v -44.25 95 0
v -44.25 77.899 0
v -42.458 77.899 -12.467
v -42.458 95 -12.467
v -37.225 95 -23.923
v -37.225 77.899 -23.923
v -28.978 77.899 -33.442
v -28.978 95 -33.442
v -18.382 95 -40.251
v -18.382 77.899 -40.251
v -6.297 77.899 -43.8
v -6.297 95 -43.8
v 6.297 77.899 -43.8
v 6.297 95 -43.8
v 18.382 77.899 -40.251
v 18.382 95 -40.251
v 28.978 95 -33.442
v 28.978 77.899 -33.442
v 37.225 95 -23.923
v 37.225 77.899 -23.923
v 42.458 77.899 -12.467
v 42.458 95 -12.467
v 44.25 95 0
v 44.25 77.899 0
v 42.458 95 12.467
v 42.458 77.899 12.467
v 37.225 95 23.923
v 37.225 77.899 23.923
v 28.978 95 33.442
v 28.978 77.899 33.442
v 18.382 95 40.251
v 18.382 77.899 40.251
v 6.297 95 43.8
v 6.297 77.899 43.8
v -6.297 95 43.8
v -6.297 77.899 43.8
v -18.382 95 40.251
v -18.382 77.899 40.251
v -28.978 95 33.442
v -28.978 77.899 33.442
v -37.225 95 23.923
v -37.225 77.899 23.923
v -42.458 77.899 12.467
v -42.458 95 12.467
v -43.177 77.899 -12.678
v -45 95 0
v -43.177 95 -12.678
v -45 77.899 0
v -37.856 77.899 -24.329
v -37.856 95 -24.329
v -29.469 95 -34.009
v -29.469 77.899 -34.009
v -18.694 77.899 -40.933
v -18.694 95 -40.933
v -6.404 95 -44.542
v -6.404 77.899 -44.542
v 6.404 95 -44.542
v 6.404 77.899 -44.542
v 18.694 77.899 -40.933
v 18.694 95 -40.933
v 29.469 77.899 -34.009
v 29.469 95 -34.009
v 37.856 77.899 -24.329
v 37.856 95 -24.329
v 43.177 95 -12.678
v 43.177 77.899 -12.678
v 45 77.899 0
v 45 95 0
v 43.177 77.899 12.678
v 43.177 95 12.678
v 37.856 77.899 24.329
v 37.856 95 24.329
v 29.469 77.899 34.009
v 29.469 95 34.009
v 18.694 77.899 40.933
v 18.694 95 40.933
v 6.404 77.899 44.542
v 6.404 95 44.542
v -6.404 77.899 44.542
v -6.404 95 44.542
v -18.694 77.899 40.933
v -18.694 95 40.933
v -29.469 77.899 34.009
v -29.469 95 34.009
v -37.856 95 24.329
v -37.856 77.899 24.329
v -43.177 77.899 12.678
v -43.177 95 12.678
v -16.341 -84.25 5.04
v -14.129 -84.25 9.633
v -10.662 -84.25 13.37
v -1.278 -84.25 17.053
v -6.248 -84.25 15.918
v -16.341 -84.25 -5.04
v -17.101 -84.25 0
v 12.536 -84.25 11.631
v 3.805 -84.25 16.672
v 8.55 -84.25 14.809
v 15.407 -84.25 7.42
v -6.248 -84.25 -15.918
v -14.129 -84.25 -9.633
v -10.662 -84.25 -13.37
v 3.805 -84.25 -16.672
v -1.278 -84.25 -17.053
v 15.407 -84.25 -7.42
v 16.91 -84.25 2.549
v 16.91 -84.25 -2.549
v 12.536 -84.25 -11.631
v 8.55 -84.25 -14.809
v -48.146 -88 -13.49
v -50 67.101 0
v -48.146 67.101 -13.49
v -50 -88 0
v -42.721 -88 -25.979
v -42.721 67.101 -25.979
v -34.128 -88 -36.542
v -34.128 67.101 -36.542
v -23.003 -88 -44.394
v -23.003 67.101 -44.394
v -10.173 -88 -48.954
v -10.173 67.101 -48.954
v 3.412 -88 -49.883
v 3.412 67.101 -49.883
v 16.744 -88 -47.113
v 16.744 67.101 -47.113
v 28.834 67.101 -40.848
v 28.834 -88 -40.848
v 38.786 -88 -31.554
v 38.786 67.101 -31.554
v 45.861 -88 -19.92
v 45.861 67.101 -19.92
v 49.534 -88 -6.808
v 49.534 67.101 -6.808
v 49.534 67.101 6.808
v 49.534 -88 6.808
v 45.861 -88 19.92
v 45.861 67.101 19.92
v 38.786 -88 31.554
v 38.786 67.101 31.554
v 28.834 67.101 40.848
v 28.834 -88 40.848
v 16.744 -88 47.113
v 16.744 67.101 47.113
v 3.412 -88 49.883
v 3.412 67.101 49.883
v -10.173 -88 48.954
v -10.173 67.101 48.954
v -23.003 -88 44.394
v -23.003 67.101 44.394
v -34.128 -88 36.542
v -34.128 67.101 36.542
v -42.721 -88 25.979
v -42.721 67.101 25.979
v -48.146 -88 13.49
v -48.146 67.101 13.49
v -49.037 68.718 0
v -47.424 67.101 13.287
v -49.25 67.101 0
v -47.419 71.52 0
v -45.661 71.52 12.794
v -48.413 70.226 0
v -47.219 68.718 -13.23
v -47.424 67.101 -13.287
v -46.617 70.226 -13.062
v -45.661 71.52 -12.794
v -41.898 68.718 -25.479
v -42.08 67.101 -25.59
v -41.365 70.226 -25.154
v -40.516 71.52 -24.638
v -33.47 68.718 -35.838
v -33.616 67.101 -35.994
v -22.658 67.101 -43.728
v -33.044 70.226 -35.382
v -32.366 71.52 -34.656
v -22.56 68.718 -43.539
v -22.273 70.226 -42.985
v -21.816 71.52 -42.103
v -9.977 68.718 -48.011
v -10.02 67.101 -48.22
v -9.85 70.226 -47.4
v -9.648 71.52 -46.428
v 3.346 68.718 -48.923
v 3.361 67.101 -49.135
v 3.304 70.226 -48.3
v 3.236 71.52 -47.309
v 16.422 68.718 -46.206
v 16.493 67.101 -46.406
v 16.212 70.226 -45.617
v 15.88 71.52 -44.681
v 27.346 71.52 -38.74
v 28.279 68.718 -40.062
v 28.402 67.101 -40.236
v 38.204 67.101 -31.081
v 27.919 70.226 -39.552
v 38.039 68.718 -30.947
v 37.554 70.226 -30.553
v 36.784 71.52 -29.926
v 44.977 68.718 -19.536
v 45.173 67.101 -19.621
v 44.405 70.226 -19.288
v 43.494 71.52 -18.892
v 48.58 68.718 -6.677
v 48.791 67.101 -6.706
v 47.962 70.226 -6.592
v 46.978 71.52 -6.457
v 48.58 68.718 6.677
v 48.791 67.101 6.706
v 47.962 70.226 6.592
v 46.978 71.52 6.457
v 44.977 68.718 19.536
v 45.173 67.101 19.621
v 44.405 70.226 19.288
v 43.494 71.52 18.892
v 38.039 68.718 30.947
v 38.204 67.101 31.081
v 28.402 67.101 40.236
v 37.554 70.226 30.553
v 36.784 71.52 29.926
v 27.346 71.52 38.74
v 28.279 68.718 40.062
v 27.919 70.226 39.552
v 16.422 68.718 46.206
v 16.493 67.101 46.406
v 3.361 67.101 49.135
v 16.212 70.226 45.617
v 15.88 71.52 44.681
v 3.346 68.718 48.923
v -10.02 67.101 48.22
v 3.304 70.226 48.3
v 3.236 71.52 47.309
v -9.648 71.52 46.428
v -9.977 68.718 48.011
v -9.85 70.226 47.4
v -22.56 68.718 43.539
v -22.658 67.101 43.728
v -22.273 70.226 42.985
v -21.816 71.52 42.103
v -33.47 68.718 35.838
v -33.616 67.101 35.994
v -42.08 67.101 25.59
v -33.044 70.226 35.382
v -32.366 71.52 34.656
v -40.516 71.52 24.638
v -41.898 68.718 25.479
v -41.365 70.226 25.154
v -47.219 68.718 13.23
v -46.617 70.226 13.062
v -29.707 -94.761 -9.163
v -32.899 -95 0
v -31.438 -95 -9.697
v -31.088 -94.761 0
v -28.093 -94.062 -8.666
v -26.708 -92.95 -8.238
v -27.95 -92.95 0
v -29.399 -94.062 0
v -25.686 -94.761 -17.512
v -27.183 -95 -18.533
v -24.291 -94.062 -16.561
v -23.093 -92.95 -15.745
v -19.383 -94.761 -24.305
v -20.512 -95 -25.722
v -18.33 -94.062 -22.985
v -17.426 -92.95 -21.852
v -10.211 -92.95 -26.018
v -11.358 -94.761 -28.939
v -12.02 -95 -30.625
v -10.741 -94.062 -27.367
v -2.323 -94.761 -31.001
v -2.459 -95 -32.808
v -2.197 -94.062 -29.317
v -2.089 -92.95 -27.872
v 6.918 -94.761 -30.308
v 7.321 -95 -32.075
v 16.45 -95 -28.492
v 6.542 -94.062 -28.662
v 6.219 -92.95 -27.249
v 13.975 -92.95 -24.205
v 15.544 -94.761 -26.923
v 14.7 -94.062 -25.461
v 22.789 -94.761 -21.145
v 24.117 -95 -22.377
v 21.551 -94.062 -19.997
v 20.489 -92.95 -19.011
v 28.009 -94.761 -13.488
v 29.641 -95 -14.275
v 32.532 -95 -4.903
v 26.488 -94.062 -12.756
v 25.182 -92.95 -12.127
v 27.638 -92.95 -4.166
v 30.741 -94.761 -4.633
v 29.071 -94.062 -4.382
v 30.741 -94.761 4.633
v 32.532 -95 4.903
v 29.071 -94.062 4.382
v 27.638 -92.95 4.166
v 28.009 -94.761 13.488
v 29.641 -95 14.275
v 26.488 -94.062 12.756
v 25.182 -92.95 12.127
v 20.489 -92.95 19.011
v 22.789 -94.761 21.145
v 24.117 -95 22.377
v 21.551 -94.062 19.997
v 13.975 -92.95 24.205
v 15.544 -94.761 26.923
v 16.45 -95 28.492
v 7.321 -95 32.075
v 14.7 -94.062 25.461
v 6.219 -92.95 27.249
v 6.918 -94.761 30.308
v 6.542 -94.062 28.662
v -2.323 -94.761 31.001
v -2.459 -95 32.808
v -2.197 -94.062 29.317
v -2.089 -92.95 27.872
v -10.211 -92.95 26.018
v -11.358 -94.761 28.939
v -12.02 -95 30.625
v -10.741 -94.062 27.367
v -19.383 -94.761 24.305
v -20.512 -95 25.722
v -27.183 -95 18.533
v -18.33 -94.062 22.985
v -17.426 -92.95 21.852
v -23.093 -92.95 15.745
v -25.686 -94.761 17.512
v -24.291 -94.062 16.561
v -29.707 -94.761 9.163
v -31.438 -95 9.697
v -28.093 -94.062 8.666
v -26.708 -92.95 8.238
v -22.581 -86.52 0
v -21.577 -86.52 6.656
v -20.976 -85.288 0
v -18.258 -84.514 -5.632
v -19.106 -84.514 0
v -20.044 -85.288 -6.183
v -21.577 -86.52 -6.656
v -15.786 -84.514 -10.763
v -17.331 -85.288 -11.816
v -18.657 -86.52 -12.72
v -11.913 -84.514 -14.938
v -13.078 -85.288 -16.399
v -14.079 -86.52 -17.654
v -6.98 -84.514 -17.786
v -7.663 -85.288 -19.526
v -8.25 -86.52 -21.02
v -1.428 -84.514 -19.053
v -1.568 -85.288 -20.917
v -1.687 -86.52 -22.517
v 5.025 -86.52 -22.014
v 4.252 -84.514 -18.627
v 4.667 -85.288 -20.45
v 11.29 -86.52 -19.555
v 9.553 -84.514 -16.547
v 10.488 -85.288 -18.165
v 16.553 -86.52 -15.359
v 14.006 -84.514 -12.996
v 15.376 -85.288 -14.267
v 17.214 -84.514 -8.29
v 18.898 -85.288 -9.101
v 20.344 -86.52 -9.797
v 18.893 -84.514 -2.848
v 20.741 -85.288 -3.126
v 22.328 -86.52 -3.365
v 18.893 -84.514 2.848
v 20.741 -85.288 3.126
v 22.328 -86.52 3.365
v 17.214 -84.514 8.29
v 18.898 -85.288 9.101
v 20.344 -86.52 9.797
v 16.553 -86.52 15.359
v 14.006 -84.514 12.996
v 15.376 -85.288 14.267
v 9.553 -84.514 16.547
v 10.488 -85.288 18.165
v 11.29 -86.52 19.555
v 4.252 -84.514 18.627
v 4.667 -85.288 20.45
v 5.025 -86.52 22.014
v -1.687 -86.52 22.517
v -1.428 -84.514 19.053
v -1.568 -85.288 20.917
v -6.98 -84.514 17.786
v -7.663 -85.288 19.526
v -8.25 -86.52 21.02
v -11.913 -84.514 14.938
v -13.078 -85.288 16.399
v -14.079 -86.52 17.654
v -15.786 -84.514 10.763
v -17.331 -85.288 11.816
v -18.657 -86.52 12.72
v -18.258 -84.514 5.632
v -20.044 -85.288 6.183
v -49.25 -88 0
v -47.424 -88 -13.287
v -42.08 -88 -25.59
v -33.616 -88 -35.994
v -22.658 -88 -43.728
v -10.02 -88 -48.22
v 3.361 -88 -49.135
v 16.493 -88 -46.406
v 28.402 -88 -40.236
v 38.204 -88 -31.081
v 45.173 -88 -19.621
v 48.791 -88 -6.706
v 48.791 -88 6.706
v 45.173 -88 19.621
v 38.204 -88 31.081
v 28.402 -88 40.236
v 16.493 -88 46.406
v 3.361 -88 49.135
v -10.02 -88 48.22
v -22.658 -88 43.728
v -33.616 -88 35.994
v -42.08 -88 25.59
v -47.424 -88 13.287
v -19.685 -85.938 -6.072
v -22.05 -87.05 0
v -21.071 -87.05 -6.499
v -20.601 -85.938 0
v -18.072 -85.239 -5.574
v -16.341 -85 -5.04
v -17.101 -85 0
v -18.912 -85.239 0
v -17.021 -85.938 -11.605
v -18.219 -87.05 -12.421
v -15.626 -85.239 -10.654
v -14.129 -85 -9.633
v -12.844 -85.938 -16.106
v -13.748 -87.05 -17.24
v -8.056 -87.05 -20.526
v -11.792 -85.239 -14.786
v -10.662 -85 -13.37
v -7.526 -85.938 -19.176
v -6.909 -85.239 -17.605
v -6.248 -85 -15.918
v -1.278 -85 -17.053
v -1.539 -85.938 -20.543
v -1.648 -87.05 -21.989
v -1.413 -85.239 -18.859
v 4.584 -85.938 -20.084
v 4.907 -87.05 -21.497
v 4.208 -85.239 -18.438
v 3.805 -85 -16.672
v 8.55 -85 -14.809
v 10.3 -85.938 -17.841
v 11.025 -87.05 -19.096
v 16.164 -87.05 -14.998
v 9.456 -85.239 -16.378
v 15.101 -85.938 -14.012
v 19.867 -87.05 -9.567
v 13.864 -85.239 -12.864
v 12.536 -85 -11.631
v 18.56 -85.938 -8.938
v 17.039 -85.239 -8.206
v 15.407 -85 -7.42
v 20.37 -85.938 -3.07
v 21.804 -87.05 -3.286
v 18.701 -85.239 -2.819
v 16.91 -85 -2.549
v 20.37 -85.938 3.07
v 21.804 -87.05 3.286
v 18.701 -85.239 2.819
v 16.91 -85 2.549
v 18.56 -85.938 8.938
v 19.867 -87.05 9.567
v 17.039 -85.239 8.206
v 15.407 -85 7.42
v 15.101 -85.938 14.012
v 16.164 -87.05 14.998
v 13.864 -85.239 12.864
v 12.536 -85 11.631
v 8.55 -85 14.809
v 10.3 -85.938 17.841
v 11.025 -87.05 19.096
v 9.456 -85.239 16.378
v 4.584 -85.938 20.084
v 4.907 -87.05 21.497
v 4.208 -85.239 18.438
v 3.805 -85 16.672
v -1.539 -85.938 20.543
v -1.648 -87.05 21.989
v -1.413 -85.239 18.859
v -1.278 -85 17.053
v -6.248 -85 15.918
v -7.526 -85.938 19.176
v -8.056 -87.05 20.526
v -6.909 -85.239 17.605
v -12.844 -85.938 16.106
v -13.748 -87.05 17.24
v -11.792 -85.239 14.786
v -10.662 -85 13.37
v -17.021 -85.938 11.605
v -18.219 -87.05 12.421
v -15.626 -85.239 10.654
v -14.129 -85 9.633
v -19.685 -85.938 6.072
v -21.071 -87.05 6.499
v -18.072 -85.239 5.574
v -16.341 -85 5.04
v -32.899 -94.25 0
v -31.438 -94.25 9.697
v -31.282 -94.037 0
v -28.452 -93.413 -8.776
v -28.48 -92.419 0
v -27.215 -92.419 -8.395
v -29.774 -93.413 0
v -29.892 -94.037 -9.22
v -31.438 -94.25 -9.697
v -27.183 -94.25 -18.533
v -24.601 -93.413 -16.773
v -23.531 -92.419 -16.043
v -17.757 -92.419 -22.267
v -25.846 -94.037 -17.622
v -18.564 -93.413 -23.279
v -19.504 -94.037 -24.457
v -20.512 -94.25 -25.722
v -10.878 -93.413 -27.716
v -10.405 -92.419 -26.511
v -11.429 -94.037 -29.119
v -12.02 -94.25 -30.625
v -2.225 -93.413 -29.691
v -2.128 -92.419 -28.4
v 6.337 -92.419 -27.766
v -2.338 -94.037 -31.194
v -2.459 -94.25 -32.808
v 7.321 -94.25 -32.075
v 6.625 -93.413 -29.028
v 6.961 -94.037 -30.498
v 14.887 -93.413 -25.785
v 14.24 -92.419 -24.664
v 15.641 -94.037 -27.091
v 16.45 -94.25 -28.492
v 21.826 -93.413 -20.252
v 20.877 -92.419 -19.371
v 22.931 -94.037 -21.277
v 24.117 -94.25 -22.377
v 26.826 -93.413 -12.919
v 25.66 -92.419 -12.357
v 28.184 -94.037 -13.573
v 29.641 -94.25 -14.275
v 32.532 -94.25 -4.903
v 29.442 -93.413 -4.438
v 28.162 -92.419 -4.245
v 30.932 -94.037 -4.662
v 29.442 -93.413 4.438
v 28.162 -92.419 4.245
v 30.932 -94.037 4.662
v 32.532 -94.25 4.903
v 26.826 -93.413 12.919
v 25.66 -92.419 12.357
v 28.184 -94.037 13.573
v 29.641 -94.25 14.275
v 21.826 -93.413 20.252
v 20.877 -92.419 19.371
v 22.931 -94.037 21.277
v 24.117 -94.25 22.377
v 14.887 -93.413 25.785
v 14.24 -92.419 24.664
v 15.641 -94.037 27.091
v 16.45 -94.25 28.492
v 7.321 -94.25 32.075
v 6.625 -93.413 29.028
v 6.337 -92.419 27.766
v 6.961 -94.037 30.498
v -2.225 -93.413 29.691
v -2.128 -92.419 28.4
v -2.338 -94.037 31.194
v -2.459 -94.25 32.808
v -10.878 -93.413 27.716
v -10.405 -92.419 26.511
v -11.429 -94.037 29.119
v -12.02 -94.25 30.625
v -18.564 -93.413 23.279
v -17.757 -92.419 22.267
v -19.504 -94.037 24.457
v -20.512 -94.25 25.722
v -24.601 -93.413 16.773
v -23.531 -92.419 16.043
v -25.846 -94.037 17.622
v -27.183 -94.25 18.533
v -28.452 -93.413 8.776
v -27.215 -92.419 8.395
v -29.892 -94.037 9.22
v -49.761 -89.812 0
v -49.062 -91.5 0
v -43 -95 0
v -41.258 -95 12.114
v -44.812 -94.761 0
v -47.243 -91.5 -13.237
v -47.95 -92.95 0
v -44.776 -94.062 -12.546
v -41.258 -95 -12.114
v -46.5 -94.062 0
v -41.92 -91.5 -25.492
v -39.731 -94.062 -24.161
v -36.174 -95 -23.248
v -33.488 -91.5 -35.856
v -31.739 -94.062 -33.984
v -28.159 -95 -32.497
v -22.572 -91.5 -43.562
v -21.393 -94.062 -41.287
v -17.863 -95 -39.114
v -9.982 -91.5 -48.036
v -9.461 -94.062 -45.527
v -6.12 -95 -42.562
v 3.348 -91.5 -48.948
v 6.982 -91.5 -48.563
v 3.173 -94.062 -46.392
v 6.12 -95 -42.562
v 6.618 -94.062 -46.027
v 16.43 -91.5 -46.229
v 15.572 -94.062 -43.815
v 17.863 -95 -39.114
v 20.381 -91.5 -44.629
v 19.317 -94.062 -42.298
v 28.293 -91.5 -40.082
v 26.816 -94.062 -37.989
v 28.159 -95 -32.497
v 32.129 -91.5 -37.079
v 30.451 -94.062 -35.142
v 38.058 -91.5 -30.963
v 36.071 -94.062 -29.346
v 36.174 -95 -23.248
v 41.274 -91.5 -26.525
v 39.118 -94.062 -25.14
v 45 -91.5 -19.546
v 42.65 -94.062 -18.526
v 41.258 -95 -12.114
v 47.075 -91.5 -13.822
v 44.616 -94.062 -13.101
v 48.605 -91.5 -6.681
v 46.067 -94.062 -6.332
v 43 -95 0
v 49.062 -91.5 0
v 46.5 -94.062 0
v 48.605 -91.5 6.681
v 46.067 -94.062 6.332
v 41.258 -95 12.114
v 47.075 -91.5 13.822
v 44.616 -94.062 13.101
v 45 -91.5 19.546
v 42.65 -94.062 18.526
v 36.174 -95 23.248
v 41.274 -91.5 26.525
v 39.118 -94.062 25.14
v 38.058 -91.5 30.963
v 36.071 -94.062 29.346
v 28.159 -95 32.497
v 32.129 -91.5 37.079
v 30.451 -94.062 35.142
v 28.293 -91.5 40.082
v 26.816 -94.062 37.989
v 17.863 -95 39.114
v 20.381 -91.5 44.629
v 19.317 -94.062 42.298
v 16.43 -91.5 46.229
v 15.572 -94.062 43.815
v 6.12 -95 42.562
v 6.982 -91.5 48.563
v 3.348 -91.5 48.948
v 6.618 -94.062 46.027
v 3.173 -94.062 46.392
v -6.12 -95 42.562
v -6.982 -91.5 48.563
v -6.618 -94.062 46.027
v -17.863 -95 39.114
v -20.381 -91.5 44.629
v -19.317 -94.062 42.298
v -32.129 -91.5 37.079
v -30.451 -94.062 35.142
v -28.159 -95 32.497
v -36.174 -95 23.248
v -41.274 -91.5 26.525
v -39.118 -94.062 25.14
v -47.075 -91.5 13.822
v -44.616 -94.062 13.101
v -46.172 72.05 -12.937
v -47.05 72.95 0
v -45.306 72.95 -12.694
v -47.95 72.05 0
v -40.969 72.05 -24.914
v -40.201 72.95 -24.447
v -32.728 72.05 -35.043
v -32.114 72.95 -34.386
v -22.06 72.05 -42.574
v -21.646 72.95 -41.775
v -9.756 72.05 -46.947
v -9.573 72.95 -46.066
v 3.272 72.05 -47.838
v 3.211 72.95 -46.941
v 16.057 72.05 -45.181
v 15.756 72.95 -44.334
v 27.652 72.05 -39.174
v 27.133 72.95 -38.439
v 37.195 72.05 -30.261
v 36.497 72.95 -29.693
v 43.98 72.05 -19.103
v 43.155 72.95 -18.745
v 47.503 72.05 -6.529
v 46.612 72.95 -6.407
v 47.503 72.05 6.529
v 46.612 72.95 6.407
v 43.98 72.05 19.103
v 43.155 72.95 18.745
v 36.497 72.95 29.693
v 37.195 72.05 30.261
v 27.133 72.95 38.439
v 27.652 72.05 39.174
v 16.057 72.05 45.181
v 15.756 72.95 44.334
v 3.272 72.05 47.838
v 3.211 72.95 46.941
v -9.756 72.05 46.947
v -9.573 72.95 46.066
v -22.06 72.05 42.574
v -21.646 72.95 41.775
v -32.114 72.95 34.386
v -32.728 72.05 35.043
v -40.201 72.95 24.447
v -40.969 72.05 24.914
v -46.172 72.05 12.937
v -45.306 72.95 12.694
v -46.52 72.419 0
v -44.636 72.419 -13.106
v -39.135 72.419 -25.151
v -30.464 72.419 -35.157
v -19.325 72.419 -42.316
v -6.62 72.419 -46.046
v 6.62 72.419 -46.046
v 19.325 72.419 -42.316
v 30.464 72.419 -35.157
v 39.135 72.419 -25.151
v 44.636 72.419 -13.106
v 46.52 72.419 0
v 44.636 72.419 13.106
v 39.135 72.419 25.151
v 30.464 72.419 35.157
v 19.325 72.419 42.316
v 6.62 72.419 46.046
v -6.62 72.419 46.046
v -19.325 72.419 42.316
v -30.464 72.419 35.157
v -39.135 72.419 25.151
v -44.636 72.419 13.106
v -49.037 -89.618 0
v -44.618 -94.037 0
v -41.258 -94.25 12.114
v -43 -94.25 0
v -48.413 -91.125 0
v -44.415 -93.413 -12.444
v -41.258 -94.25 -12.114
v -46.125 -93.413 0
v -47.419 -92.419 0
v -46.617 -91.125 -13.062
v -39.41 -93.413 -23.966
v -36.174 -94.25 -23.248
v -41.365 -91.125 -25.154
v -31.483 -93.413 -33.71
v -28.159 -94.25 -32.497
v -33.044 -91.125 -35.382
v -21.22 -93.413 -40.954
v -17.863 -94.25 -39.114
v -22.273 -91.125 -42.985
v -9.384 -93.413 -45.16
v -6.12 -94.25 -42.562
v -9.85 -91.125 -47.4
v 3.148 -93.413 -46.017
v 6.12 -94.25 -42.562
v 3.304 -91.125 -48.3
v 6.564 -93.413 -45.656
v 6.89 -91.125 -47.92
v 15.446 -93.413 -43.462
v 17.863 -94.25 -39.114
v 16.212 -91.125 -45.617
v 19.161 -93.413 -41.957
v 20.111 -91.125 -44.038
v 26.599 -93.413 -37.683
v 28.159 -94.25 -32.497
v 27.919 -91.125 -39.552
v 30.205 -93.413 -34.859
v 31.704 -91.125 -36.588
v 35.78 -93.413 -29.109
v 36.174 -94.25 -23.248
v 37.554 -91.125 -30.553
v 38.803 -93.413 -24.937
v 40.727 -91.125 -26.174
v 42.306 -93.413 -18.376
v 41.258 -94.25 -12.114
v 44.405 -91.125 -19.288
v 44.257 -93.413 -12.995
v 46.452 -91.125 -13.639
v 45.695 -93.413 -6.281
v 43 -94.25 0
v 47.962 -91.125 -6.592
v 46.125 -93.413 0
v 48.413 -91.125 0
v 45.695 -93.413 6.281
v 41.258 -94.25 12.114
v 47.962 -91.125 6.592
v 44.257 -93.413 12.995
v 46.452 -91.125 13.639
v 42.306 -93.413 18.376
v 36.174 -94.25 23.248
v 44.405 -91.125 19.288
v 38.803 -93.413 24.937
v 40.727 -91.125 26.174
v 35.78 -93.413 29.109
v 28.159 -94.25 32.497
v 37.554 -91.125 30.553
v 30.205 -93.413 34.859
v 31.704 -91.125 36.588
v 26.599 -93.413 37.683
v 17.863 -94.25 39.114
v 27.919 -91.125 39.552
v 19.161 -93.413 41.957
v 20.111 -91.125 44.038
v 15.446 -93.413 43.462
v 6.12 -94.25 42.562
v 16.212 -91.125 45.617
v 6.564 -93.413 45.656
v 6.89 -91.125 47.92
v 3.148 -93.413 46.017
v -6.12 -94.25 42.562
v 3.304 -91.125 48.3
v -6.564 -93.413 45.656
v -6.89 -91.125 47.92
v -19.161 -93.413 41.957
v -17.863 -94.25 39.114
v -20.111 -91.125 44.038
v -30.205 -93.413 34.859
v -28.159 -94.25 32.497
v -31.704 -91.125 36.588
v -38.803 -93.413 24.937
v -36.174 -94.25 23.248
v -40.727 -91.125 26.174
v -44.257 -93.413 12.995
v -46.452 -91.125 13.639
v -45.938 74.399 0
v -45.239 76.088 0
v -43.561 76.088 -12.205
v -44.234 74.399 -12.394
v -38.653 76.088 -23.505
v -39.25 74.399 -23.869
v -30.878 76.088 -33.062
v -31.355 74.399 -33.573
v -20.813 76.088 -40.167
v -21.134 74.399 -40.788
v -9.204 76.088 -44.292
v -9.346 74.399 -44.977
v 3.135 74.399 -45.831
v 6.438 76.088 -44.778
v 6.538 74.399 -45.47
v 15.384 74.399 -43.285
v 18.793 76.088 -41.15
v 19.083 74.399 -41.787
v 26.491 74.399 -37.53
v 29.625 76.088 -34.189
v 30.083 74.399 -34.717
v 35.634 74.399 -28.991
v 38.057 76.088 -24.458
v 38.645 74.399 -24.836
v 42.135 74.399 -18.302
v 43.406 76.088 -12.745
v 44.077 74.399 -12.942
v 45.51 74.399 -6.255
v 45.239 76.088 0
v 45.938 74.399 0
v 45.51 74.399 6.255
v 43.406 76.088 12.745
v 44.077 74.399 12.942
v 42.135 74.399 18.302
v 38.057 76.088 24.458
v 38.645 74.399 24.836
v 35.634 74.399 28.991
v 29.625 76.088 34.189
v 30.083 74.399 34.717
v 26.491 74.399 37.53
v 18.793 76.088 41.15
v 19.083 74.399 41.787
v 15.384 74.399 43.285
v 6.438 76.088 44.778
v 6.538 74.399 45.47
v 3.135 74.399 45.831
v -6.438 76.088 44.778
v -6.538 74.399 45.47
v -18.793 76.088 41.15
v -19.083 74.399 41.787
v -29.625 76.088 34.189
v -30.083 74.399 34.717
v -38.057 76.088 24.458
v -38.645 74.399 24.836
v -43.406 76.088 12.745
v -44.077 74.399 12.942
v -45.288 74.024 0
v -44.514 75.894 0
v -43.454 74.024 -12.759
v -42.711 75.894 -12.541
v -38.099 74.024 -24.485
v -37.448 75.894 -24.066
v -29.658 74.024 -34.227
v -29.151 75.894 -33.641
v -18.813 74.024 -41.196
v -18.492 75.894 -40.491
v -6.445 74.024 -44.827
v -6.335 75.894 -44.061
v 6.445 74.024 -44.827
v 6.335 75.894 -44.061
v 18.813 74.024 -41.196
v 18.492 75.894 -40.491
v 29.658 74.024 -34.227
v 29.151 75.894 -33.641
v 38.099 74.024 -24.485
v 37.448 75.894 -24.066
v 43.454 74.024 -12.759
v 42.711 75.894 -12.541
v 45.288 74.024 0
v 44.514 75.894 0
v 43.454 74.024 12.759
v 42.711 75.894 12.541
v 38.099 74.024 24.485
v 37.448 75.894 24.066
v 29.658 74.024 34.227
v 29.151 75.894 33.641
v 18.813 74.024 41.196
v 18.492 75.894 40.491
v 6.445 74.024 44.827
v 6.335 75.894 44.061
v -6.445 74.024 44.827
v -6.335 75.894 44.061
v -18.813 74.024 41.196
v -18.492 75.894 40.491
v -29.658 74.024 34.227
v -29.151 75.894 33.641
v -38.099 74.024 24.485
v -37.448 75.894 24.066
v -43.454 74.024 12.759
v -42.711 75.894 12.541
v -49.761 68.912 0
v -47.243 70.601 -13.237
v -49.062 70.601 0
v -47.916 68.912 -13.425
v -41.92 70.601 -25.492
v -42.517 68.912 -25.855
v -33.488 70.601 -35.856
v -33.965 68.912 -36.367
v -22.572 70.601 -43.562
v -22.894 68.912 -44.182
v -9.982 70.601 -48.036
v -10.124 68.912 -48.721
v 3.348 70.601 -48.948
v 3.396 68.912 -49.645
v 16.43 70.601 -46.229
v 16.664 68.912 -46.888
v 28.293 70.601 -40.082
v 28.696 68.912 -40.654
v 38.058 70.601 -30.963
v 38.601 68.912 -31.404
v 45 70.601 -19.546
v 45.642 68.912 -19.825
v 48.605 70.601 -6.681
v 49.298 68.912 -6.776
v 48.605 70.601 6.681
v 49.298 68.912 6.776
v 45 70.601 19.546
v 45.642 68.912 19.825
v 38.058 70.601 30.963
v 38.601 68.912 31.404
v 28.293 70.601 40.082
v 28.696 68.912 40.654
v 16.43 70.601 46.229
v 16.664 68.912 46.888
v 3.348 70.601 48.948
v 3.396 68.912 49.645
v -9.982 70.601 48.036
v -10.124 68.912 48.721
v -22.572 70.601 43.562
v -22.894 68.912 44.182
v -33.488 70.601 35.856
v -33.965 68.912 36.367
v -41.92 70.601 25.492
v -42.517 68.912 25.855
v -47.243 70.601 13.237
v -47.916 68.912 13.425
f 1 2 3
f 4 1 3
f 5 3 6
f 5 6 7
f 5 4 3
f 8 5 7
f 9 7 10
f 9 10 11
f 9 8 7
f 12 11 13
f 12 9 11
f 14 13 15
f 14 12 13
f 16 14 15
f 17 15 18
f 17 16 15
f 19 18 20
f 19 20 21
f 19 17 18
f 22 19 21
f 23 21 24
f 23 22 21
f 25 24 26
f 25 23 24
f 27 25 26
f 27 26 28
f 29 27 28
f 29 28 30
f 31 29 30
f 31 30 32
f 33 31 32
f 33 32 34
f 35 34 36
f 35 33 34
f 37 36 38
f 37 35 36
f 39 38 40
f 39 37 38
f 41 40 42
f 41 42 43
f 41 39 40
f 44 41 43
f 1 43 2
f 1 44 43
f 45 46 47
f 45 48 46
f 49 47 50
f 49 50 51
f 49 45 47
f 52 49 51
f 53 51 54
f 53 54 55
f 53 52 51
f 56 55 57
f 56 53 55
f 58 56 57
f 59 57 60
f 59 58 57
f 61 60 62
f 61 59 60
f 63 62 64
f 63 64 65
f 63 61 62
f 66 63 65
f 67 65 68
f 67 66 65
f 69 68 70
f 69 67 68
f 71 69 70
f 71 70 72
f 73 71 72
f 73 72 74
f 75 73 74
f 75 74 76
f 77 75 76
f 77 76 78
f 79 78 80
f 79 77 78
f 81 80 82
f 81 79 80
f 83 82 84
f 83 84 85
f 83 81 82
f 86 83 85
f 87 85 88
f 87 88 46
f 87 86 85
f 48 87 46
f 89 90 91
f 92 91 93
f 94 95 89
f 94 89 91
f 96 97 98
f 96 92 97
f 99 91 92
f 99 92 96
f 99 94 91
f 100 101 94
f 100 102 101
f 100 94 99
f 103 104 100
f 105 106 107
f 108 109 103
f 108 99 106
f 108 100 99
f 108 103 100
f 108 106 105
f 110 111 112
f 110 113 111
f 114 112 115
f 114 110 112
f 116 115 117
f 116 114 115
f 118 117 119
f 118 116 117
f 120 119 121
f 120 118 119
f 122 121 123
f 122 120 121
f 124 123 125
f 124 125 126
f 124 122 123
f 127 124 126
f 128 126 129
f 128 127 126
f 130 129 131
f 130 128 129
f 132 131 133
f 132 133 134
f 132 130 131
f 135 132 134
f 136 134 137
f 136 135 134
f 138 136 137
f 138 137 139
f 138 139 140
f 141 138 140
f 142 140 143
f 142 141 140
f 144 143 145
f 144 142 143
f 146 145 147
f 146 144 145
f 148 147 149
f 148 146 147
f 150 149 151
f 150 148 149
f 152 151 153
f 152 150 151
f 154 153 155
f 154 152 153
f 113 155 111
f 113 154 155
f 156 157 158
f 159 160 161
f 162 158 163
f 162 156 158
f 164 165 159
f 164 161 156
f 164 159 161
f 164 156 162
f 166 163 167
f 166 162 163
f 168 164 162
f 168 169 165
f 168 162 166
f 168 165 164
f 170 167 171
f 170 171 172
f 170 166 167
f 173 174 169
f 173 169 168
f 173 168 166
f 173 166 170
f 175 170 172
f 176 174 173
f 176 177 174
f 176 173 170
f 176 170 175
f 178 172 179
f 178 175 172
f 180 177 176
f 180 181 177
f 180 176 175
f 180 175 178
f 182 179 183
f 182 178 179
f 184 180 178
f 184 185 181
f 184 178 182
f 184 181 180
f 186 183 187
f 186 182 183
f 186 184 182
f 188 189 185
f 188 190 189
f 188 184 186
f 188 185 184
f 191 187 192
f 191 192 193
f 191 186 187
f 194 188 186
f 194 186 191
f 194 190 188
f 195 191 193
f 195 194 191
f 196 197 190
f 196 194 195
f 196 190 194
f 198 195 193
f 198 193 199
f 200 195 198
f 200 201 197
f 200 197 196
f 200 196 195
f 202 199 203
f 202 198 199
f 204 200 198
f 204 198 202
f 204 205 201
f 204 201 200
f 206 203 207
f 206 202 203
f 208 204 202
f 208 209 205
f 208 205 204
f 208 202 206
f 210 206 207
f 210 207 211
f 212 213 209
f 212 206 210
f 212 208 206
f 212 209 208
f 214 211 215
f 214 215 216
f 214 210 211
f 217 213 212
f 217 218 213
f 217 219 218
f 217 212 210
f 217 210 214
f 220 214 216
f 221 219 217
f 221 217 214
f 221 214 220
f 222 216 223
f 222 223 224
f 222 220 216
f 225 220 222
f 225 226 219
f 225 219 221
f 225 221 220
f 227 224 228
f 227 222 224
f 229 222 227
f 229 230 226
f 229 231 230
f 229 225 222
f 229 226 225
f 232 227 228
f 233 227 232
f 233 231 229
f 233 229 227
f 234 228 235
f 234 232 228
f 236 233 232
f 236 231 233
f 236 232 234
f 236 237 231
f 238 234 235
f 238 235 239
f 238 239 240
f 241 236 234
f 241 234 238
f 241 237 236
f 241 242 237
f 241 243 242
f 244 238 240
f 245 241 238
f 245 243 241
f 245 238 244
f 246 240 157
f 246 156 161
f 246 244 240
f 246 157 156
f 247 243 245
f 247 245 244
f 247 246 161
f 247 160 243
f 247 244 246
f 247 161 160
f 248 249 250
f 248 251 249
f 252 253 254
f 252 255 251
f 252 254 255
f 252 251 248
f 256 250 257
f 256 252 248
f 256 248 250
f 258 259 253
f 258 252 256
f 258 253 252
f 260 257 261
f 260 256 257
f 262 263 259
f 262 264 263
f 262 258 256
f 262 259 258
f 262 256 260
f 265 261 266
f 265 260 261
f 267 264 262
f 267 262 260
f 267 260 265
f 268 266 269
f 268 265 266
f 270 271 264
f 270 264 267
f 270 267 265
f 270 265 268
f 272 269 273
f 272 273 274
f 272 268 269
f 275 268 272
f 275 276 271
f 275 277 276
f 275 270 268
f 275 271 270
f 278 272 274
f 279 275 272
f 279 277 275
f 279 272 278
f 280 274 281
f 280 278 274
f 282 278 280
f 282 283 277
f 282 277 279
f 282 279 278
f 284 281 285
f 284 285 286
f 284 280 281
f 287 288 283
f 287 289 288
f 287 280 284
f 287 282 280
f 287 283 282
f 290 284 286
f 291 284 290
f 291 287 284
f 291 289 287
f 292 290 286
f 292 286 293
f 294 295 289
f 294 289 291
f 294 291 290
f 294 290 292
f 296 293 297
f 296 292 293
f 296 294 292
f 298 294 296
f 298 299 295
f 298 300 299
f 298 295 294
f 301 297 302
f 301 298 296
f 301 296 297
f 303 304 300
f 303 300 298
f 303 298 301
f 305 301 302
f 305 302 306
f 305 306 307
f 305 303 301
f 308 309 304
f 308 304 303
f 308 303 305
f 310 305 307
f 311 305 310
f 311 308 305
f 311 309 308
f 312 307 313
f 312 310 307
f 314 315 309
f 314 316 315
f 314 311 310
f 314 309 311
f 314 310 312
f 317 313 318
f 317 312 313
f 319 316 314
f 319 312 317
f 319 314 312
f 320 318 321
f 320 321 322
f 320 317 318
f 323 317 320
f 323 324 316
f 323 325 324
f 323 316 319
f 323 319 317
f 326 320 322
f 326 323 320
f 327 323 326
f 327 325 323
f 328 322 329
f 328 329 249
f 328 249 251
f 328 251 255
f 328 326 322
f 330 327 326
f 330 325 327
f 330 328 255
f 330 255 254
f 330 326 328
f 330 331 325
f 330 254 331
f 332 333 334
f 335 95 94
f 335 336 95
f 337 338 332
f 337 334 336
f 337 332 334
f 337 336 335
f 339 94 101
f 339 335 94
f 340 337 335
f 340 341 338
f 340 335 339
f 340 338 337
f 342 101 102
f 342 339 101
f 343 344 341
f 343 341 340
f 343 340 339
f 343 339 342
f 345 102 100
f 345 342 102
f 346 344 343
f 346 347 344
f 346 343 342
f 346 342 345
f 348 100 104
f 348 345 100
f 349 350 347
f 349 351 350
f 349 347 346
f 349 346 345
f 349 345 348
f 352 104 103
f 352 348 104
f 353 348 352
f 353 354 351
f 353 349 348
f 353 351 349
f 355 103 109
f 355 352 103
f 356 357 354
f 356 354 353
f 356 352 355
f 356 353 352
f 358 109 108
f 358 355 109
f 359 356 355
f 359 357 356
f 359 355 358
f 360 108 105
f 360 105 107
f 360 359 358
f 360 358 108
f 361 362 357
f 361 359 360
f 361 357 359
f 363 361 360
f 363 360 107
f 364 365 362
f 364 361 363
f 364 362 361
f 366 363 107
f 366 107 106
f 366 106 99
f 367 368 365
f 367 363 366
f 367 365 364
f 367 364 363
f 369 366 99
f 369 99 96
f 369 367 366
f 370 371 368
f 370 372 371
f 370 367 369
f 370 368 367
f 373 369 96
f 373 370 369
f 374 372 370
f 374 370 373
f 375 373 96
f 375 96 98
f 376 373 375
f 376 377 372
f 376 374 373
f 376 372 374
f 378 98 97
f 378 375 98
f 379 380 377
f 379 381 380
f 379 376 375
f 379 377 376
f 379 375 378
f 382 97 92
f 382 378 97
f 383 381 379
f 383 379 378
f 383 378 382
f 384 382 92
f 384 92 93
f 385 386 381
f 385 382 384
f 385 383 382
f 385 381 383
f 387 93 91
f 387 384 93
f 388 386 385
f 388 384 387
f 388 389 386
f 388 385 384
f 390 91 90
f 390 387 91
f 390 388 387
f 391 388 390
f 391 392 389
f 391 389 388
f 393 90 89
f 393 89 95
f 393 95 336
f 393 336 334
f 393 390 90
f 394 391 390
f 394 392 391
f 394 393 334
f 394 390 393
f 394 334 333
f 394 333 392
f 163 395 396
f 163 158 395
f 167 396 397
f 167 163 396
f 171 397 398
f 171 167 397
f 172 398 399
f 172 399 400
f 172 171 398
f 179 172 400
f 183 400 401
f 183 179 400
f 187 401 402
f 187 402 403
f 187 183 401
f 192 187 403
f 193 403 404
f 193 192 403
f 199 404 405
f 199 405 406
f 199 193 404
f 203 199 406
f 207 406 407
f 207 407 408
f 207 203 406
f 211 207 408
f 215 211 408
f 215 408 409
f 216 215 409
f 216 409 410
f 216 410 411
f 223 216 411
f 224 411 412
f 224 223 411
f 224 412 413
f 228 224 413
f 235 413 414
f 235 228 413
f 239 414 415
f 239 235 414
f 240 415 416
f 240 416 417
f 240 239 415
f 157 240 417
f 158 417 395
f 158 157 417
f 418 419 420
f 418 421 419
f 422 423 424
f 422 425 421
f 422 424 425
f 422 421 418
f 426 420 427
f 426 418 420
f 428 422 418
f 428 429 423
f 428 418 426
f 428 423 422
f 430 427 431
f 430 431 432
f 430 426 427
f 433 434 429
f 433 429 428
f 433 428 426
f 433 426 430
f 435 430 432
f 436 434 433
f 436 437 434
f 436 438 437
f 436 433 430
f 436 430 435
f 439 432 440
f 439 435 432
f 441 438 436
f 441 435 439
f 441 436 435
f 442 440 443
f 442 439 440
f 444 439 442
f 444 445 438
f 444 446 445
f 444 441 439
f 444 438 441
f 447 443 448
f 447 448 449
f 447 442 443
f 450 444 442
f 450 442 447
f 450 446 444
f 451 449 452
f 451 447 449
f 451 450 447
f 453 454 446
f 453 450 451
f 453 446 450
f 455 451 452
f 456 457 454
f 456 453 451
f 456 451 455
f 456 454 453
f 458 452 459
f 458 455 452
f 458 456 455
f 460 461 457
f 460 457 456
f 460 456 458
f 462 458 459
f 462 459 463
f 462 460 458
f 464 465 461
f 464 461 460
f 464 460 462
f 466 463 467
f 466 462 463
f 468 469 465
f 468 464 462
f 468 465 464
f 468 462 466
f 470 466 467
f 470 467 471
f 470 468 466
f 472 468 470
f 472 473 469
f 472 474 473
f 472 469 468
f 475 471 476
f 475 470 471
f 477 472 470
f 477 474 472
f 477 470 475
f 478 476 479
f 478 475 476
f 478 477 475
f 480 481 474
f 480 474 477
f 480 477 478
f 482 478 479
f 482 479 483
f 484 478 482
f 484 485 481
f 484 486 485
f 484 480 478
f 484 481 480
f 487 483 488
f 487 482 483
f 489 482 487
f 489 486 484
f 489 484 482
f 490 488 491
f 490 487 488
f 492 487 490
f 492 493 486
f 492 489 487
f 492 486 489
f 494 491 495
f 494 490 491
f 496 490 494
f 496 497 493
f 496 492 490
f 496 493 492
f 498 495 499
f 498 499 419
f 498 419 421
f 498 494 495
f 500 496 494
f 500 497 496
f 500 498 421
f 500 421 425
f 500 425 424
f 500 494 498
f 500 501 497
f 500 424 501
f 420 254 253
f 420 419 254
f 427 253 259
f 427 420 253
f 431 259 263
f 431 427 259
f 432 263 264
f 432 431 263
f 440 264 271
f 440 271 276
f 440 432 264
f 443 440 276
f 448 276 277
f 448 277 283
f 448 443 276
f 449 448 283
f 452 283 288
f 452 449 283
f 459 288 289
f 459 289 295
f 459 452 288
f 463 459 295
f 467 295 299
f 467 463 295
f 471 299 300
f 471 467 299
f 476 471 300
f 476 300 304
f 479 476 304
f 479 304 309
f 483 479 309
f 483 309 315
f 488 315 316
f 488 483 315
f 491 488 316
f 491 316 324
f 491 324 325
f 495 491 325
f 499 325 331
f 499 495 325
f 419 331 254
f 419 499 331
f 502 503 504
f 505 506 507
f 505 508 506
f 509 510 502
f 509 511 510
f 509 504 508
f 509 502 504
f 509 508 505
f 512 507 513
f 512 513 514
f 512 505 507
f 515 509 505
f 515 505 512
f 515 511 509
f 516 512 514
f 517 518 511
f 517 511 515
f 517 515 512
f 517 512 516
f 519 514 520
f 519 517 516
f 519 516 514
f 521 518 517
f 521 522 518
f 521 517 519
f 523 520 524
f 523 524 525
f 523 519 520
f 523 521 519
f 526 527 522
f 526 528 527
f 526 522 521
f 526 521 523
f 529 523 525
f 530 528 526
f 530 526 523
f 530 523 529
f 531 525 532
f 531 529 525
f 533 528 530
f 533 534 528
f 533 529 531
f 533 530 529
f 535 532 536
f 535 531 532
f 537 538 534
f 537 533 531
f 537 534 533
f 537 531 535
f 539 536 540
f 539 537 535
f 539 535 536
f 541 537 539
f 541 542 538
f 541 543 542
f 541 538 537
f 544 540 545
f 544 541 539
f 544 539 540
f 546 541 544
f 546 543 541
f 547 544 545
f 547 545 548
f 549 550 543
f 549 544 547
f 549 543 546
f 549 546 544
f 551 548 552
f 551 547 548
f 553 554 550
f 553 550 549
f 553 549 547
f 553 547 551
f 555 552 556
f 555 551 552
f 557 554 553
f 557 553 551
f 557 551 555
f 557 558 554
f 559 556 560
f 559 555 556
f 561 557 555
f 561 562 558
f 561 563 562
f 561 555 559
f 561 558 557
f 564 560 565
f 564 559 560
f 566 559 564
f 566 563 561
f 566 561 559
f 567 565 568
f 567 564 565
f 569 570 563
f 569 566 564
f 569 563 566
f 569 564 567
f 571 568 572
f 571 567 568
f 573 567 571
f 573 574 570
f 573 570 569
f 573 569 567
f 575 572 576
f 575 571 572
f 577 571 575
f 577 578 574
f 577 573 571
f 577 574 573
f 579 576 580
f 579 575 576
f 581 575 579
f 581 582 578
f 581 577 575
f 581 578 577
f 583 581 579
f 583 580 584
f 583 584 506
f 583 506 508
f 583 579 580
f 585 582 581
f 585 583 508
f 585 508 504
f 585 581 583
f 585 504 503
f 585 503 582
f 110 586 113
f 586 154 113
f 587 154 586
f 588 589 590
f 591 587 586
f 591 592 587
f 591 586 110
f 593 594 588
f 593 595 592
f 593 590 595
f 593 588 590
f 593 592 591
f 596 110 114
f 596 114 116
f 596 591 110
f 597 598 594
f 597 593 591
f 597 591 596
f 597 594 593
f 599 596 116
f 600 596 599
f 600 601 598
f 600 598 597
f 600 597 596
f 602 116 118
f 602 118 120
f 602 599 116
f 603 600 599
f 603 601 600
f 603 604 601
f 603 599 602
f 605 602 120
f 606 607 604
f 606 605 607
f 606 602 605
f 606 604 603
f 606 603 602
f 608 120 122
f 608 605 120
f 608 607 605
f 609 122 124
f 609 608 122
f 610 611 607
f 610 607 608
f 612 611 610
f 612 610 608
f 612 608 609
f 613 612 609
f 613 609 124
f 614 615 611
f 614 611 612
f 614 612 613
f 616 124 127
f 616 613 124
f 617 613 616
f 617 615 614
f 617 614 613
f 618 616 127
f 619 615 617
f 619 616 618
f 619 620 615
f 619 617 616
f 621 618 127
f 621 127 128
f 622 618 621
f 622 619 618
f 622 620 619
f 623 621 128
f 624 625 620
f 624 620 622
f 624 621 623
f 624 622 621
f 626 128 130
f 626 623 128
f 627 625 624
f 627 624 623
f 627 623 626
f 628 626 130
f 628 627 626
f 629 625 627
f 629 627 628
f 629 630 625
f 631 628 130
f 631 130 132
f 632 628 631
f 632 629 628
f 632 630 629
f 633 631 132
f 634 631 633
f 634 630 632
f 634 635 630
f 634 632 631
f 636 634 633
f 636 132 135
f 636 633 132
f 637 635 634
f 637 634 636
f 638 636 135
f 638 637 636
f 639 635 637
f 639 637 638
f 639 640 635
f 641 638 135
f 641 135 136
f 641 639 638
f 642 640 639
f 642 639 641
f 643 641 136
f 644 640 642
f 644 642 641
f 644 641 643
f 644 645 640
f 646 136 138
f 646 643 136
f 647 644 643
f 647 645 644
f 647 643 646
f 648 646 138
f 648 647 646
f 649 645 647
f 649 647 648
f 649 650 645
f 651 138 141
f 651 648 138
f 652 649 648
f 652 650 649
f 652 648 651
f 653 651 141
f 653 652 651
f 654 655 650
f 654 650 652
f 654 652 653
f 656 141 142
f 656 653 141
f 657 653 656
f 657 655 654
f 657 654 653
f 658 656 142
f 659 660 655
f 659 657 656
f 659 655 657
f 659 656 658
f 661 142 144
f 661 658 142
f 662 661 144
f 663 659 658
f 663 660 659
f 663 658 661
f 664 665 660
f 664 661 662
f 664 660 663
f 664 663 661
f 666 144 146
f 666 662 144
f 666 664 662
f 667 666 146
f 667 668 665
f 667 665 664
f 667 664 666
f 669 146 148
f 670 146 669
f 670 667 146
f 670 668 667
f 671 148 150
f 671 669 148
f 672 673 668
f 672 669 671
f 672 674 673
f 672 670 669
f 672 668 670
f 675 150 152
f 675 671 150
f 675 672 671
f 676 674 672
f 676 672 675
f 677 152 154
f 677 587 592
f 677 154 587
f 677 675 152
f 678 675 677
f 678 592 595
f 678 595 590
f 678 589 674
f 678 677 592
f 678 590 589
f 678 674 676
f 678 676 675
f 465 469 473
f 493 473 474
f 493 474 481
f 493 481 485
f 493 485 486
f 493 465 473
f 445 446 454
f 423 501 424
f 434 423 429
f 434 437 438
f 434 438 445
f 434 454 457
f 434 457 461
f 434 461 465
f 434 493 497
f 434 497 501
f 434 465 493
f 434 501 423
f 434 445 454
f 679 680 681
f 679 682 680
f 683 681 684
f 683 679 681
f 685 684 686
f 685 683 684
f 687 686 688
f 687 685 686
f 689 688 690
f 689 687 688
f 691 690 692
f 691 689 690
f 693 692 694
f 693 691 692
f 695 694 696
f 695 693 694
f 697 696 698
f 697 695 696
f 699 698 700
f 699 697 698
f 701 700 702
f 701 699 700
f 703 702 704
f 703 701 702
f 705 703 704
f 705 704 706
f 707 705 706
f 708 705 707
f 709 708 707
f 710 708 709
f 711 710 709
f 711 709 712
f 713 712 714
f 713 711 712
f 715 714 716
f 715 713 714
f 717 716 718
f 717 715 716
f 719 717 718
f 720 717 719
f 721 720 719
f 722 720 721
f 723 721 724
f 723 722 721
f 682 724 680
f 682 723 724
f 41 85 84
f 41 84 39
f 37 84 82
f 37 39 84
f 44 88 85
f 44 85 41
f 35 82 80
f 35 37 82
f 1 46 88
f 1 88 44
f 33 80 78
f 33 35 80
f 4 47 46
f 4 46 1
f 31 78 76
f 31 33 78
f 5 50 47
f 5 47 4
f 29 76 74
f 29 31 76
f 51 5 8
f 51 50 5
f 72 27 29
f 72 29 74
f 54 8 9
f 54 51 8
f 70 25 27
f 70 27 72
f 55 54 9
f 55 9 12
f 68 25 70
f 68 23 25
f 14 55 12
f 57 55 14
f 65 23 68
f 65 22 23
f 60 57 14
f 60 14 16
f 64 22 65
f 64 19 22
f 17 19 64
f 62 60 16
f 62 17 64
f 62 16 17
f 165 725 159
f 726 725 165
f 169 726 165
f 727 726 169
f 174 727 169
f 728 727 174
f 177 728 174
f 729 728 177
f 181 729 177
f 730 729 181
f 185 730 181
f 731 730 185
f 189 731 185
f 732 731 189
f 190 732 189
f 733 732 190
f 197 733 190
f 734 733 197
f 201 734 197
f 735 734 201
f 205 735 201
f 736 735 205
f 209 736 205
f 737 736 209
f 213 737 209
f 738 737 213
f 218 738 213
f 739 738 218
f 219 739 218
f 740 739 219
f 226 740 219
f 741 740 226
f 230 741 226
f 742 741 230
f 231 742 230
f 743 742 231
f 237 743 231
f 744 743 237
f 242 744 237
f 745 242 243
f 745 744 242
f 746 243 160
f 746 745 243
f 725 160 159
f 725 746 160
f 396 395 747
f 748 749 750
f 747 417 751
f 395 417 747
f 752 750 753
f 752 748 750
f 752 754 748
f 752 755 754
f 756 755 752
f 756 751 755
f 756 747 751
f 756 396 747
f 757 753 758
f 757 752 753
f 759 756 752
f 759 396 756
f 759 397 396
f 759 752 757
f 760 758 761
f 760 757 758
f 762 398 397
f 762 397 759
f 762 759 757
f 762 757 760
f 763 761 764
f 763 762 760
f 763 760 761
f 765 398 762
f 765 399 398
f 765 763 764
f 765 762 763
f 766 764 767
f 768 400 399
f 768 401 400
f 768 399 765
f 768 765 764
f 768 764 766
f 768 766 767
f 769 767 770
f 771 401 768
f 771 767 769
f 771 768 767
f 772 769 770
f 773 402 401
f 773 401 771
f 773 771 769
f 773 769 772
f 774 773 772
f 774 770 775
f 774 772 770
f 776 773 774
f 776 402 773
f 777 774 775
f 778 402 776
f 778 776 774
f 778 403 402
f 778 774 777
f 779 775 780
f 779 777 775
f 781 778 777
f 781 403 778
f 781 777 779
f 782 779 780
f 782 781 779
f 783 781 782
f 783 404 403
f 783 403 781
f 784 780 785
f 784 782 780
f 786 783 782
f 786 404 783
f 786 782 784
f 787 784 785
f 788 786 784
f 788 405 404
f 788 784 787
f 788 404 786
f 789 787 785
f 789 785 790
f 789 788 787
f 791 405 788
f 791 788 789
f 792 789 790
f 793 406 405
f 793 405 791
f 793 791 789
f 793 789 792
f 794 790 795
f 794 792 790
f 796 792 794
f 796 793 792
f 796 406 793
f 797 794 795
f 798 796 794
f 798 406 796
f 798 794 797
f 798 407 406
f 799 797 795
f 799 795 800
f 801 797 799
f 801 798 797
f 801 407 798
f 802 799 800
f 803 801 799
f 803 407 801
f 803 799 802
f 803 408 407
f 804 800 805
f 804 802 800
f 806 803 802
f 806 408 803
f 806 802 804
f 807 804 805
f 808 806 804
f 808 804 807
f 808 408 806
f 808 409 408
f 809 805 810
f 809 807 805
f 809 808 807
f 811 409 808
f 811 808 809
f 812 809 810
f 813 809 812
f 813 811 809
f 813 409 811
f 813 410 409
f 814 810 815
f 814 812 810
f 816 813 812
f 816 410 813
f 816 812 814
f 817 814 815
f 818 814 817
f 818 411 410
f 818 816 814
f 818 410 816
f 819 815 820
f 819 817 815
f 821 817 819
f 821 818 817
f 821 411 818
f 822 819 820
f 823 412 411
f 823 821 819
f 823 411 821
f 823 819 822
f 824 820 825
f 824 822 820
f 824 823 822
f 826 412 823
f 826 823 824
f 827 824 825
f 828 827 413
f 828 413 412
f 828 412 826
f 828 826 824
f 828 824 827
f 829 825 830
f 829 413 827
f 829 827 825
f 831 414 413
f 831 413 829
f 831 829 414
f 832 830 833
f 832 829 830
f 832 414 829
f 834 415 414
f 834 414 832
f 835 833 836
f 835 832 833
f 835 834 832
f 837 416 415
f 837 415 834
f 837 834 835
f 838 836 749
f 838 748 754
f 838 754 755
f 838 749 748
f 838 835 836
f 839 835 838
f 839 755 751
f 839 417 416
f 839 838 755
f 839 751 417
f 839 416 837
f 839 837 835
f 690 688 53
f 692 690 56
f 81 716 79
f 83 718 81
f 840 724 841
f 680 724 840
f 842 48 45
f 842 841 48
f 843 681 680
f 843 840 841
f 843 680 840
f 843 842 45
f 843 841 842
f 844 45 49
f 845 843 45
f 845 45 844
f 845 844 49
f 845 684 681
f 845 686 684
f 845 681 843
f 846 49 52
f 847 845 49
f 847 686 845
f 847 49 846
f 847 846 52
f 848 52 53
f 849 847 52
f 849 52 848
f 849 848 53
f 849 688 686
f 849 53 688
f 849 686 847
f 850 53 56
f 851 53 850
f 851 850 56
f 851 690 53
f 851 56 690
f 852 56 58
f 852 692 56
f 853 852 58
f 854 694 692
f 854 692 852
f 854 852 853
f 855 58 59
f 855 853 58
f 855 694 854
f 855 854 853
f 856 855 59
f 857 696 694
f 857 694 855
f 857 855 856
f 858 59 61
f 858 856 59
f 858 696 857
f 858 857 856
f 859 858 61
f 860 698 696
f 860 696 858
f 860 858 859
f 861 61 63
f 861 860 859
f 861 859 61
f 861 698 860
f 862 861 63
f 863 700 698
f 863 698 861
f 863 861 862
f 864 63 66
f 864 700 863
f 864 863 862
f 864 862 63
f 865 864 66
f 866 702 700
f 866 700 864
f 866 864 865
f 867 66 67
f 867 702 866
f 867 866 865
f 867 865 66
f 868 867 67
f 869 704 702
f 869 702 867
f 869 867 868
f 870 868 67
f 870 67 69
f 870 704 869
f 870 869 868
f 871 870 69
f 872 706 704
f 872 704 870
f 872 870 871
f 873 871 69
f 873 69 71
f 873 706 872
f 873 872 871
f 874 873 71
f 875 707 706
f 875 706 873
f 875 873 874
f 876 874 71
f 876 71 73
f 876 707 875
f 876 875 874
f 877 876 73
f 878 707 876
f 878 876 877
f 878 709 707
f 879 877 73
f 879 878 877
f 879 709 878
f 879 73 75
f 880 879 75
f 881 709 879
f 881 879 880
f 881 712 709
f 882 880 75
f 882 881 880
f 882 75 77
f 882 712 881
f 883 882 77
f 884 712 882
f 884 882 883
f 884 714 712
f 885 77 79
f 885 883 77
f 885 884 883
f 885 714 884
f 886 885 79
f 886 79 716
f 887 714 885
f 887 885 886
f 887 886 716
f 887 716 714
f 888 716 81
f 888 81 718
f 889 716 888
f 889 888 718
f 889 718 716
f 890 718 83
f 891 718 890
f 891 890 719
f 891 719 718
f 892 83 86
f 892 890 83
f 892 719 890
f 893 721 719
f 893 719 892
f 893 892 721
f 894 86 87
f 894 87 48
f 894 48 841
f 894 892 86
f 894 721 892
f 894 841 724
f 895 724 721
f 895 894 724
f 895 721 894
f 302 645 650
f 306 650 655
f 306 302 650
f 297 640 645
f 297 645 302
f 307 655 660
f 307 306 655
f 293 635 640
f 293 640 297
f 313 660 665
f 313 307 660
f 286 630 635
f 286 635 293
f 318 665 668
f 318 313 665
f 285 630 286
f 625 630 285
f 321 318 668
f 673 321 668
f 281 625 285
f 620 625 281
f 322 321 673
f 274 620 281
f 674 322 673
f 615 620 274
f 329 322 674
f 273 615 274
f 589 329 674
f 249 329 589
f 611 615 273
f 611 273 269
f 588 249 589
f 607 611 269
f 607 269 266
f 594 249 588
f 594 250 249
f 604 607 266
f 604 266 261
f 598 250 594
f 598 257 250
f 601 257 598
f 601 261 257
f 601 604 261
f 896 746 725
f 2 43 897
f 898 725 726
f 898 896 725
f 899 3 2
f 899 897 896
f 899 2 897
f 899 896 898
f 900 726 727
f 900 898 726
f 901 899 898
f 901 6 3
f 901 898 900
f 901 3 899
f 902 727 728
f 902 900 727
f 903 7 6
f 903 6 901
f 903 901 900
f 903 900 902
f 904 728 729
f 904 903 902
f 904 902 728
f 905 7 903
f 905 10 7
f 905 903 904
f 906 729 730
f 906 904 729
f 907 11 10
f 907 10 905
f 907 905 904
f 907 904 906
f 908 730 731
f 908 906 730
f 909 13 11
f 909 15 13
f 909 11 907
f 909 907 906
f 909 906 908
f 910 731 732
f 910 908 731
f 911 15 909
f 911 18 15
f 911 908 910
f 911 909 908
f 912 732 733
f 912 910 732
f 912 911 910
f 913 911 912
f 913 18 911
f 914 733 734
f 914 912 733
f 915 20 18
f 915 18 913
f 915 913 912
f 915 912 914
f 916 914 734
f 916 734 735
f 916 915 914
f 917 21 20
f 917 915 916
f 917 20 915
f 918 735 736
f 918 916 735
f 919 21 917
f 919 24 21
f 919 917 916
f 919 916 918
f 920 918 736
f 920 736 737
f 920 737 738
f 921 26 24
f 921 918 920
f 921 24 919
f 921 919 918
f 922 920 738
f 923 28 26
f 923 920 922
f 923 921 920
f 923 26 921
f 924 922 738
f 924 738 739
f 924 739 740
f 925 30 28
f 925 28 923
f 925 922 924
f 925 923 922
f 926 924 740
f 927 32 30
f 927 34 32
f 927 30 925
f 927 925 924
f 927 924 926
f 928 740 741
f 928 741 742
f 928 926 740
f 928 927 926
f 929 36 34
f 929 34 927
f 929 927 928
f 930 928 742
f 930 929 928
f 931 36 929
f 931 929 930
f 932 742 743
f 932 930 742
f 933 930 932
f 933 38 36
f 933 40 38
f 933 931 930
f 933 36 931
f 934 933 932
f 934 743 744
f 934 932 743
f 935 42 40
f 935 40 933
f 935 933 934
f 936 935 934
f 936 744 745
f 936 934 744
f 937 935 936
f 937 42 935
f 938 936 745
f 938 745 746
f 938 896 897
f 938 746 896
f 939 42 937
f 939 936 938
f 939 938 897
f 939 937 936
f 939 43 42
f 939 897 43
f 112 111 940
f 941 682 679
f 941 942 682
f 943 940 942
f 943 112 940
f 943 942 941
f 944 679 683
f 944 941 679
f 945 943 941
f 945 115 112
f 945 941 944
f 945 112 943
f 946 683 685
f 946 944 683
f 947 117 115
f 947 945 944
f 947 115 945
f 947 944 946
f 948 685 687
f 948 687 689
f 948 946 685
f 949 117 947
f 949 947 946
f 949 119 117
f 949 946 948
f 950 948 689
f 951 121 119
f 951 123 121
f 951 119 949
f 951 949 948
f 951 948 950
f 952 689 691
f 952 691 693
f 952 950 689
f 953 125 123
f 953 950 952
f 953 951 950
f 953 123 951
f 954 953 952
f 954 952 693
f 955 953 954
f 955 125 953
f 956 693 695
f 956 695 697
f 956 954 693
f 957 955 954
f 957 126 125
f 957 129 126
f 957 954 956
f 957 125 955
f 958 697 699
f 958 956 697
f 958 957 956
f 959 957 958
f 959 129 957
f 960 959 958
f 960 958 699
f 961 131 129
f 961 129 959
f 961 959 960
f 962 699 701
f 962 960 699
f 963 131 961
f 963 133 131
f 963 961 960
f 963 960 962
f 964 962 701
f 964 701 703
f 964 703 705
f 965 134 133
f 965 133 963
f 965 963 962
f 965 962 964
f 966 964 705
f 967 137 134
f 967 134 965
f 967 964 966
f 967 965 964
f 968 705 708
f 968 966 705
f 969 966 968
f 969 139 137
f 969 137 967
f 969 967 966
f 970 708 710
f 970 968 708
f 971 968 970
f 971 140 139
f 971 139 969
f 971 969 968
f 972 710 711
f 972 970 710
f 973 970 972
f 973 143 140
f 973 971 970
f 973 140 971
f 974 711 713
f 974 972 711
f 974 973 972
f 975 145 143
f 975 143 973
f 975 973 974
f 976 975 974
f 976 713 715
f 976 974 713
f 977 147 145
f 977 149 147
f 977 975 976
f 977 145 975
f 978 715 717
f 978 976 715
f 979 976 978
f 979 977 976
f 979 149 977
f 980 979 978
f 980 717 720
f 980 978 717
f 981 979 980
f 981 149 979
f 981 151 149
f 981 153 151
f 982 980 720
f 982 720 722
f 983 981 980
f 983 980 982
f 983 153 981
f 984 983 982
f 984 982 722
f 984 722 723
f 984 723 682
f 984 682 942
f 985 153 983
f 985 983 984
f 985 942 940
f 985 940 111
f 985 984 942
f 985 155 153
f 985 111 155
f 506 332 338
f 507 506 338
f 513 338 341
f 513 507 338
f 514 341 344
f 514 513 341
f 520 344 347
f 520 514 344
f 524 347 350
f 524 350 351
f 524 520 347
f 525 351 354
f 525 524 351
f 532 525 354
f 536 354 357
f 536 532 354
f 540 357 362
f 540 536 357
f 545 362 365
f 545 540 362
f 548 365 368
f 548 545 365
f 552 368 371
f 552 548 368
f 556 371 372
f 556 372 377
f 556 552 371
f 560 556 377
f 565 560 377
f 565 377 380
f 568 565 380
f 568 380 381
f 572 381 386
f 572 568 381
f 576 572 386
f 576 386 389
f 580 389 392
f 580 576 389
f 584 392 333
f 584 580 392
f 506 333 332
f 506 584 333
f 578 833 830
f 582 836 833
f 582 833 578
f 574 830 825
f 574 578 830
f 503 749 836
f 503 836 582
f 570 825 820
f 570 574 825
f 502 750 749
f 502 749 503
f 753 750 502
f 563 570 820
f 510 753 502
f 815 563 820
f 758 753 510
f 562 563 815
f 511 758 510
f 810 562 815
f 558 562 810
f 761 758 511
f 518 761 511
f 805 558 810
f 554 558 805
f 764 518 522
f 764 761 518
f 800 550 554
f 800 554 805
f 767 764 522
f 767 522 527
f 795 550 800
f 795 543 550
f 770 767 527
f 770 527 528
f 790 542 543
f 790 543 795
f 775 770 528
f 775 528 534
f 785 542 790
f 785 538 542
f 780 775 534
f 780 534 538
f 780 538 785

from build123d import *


# Not quite as in the source:
# - ends of sketch curves that miss each other by under 0.0002 mm in the source are joined


with BuildPart() as f1:
    # F0 (on Top) → F1 (revolve)
    with BuildSketch(Plane.XY):
        with BuildLine():
            Line((-50, 0), (-49.25, 0))
            Line((-49.25, 0), (-49.25, 67.100505))
            ThreePointArc((-49.25, 67.100505), (-48.7742470782, 69.4922764523), (-47.4194173824, 71.5199223824))
            Line((-47.4194173824, 71.5199223824), (-46.519922, 72.419417))
            ThreePointArc((-46.519922, 72.419417), (-44.839933623, 74.9336983992), (-44.25, 77.899495))
            Line((-44.25, 77.899495), (-44.25, 95))
            Line((-44.25, 95), (-45, 95))
            Line((-45, 95), (-45, 77.899495))
            ThreePointArc((-45, 77.899495), (-45.5328434077, 75.2207106468), (-47.0502530317, 72.9497470317))
            Line((-47.0502530317, 72.9497470317), (-47.949748, 72.050252))
            ThreePointArc((-47.949748, 72.050252), (-49.4671568629, 69.7792886999), (-50, 67.100505))
            Line((-50, 67.100505), (-50, 0))
        make_face()
        with BuildLine():
            Line((0, -85), (0, -84.25))
            Line((0, -84.25), (-17.100505, -84.25))
            ThreePointArc((-17.100505, -84.25), (-20.0663019275, -84.8399337583), (-22.5805830542, -86.5199229458))
            Line((-22.5805830542, -86.5199229458), (-28.480078, -92.419418))
            ThreePointArc((-28.480078, -92.419418), (-30.5077238744, -93.7742472135), (-32.899495, -94.25))
            Line((-32.899495, -94.25), (-43, -94.25))
            ThreePointArc((-43, -94.25), (-47.4194173824, -92.4194173824), (-49.25, -88))
            Line((-49.25, -88), (-49.25, 0))
            Line((-49.25, 0), (-50, 0))
            Line((-50, 0), (-50, -88))
            ThreePointArc((-50, -88), (-47.9497474683, -92.9497474683), (-43, -95))
            Line((-43, -95), (-32.899495, -95))
            ThreePointArc((-32.899495, -95), (-30.2207113001, -94.4671568629), (-27.9497480317, -92.9497479683))
            Line((-27.9497480317, -92.9497479683), (-22.050253, -87.050253))
            ThreePointArc((-22.050253, -87.050253), (-19.7792893532, -85.5328434077), (-17.100505, -85))
            Line((-17.100505, -85), (0, -85))
        make_face()
    revolve(axis=Axis((0, 0, 0), (0, -1, 0)))


solid = f1.part
